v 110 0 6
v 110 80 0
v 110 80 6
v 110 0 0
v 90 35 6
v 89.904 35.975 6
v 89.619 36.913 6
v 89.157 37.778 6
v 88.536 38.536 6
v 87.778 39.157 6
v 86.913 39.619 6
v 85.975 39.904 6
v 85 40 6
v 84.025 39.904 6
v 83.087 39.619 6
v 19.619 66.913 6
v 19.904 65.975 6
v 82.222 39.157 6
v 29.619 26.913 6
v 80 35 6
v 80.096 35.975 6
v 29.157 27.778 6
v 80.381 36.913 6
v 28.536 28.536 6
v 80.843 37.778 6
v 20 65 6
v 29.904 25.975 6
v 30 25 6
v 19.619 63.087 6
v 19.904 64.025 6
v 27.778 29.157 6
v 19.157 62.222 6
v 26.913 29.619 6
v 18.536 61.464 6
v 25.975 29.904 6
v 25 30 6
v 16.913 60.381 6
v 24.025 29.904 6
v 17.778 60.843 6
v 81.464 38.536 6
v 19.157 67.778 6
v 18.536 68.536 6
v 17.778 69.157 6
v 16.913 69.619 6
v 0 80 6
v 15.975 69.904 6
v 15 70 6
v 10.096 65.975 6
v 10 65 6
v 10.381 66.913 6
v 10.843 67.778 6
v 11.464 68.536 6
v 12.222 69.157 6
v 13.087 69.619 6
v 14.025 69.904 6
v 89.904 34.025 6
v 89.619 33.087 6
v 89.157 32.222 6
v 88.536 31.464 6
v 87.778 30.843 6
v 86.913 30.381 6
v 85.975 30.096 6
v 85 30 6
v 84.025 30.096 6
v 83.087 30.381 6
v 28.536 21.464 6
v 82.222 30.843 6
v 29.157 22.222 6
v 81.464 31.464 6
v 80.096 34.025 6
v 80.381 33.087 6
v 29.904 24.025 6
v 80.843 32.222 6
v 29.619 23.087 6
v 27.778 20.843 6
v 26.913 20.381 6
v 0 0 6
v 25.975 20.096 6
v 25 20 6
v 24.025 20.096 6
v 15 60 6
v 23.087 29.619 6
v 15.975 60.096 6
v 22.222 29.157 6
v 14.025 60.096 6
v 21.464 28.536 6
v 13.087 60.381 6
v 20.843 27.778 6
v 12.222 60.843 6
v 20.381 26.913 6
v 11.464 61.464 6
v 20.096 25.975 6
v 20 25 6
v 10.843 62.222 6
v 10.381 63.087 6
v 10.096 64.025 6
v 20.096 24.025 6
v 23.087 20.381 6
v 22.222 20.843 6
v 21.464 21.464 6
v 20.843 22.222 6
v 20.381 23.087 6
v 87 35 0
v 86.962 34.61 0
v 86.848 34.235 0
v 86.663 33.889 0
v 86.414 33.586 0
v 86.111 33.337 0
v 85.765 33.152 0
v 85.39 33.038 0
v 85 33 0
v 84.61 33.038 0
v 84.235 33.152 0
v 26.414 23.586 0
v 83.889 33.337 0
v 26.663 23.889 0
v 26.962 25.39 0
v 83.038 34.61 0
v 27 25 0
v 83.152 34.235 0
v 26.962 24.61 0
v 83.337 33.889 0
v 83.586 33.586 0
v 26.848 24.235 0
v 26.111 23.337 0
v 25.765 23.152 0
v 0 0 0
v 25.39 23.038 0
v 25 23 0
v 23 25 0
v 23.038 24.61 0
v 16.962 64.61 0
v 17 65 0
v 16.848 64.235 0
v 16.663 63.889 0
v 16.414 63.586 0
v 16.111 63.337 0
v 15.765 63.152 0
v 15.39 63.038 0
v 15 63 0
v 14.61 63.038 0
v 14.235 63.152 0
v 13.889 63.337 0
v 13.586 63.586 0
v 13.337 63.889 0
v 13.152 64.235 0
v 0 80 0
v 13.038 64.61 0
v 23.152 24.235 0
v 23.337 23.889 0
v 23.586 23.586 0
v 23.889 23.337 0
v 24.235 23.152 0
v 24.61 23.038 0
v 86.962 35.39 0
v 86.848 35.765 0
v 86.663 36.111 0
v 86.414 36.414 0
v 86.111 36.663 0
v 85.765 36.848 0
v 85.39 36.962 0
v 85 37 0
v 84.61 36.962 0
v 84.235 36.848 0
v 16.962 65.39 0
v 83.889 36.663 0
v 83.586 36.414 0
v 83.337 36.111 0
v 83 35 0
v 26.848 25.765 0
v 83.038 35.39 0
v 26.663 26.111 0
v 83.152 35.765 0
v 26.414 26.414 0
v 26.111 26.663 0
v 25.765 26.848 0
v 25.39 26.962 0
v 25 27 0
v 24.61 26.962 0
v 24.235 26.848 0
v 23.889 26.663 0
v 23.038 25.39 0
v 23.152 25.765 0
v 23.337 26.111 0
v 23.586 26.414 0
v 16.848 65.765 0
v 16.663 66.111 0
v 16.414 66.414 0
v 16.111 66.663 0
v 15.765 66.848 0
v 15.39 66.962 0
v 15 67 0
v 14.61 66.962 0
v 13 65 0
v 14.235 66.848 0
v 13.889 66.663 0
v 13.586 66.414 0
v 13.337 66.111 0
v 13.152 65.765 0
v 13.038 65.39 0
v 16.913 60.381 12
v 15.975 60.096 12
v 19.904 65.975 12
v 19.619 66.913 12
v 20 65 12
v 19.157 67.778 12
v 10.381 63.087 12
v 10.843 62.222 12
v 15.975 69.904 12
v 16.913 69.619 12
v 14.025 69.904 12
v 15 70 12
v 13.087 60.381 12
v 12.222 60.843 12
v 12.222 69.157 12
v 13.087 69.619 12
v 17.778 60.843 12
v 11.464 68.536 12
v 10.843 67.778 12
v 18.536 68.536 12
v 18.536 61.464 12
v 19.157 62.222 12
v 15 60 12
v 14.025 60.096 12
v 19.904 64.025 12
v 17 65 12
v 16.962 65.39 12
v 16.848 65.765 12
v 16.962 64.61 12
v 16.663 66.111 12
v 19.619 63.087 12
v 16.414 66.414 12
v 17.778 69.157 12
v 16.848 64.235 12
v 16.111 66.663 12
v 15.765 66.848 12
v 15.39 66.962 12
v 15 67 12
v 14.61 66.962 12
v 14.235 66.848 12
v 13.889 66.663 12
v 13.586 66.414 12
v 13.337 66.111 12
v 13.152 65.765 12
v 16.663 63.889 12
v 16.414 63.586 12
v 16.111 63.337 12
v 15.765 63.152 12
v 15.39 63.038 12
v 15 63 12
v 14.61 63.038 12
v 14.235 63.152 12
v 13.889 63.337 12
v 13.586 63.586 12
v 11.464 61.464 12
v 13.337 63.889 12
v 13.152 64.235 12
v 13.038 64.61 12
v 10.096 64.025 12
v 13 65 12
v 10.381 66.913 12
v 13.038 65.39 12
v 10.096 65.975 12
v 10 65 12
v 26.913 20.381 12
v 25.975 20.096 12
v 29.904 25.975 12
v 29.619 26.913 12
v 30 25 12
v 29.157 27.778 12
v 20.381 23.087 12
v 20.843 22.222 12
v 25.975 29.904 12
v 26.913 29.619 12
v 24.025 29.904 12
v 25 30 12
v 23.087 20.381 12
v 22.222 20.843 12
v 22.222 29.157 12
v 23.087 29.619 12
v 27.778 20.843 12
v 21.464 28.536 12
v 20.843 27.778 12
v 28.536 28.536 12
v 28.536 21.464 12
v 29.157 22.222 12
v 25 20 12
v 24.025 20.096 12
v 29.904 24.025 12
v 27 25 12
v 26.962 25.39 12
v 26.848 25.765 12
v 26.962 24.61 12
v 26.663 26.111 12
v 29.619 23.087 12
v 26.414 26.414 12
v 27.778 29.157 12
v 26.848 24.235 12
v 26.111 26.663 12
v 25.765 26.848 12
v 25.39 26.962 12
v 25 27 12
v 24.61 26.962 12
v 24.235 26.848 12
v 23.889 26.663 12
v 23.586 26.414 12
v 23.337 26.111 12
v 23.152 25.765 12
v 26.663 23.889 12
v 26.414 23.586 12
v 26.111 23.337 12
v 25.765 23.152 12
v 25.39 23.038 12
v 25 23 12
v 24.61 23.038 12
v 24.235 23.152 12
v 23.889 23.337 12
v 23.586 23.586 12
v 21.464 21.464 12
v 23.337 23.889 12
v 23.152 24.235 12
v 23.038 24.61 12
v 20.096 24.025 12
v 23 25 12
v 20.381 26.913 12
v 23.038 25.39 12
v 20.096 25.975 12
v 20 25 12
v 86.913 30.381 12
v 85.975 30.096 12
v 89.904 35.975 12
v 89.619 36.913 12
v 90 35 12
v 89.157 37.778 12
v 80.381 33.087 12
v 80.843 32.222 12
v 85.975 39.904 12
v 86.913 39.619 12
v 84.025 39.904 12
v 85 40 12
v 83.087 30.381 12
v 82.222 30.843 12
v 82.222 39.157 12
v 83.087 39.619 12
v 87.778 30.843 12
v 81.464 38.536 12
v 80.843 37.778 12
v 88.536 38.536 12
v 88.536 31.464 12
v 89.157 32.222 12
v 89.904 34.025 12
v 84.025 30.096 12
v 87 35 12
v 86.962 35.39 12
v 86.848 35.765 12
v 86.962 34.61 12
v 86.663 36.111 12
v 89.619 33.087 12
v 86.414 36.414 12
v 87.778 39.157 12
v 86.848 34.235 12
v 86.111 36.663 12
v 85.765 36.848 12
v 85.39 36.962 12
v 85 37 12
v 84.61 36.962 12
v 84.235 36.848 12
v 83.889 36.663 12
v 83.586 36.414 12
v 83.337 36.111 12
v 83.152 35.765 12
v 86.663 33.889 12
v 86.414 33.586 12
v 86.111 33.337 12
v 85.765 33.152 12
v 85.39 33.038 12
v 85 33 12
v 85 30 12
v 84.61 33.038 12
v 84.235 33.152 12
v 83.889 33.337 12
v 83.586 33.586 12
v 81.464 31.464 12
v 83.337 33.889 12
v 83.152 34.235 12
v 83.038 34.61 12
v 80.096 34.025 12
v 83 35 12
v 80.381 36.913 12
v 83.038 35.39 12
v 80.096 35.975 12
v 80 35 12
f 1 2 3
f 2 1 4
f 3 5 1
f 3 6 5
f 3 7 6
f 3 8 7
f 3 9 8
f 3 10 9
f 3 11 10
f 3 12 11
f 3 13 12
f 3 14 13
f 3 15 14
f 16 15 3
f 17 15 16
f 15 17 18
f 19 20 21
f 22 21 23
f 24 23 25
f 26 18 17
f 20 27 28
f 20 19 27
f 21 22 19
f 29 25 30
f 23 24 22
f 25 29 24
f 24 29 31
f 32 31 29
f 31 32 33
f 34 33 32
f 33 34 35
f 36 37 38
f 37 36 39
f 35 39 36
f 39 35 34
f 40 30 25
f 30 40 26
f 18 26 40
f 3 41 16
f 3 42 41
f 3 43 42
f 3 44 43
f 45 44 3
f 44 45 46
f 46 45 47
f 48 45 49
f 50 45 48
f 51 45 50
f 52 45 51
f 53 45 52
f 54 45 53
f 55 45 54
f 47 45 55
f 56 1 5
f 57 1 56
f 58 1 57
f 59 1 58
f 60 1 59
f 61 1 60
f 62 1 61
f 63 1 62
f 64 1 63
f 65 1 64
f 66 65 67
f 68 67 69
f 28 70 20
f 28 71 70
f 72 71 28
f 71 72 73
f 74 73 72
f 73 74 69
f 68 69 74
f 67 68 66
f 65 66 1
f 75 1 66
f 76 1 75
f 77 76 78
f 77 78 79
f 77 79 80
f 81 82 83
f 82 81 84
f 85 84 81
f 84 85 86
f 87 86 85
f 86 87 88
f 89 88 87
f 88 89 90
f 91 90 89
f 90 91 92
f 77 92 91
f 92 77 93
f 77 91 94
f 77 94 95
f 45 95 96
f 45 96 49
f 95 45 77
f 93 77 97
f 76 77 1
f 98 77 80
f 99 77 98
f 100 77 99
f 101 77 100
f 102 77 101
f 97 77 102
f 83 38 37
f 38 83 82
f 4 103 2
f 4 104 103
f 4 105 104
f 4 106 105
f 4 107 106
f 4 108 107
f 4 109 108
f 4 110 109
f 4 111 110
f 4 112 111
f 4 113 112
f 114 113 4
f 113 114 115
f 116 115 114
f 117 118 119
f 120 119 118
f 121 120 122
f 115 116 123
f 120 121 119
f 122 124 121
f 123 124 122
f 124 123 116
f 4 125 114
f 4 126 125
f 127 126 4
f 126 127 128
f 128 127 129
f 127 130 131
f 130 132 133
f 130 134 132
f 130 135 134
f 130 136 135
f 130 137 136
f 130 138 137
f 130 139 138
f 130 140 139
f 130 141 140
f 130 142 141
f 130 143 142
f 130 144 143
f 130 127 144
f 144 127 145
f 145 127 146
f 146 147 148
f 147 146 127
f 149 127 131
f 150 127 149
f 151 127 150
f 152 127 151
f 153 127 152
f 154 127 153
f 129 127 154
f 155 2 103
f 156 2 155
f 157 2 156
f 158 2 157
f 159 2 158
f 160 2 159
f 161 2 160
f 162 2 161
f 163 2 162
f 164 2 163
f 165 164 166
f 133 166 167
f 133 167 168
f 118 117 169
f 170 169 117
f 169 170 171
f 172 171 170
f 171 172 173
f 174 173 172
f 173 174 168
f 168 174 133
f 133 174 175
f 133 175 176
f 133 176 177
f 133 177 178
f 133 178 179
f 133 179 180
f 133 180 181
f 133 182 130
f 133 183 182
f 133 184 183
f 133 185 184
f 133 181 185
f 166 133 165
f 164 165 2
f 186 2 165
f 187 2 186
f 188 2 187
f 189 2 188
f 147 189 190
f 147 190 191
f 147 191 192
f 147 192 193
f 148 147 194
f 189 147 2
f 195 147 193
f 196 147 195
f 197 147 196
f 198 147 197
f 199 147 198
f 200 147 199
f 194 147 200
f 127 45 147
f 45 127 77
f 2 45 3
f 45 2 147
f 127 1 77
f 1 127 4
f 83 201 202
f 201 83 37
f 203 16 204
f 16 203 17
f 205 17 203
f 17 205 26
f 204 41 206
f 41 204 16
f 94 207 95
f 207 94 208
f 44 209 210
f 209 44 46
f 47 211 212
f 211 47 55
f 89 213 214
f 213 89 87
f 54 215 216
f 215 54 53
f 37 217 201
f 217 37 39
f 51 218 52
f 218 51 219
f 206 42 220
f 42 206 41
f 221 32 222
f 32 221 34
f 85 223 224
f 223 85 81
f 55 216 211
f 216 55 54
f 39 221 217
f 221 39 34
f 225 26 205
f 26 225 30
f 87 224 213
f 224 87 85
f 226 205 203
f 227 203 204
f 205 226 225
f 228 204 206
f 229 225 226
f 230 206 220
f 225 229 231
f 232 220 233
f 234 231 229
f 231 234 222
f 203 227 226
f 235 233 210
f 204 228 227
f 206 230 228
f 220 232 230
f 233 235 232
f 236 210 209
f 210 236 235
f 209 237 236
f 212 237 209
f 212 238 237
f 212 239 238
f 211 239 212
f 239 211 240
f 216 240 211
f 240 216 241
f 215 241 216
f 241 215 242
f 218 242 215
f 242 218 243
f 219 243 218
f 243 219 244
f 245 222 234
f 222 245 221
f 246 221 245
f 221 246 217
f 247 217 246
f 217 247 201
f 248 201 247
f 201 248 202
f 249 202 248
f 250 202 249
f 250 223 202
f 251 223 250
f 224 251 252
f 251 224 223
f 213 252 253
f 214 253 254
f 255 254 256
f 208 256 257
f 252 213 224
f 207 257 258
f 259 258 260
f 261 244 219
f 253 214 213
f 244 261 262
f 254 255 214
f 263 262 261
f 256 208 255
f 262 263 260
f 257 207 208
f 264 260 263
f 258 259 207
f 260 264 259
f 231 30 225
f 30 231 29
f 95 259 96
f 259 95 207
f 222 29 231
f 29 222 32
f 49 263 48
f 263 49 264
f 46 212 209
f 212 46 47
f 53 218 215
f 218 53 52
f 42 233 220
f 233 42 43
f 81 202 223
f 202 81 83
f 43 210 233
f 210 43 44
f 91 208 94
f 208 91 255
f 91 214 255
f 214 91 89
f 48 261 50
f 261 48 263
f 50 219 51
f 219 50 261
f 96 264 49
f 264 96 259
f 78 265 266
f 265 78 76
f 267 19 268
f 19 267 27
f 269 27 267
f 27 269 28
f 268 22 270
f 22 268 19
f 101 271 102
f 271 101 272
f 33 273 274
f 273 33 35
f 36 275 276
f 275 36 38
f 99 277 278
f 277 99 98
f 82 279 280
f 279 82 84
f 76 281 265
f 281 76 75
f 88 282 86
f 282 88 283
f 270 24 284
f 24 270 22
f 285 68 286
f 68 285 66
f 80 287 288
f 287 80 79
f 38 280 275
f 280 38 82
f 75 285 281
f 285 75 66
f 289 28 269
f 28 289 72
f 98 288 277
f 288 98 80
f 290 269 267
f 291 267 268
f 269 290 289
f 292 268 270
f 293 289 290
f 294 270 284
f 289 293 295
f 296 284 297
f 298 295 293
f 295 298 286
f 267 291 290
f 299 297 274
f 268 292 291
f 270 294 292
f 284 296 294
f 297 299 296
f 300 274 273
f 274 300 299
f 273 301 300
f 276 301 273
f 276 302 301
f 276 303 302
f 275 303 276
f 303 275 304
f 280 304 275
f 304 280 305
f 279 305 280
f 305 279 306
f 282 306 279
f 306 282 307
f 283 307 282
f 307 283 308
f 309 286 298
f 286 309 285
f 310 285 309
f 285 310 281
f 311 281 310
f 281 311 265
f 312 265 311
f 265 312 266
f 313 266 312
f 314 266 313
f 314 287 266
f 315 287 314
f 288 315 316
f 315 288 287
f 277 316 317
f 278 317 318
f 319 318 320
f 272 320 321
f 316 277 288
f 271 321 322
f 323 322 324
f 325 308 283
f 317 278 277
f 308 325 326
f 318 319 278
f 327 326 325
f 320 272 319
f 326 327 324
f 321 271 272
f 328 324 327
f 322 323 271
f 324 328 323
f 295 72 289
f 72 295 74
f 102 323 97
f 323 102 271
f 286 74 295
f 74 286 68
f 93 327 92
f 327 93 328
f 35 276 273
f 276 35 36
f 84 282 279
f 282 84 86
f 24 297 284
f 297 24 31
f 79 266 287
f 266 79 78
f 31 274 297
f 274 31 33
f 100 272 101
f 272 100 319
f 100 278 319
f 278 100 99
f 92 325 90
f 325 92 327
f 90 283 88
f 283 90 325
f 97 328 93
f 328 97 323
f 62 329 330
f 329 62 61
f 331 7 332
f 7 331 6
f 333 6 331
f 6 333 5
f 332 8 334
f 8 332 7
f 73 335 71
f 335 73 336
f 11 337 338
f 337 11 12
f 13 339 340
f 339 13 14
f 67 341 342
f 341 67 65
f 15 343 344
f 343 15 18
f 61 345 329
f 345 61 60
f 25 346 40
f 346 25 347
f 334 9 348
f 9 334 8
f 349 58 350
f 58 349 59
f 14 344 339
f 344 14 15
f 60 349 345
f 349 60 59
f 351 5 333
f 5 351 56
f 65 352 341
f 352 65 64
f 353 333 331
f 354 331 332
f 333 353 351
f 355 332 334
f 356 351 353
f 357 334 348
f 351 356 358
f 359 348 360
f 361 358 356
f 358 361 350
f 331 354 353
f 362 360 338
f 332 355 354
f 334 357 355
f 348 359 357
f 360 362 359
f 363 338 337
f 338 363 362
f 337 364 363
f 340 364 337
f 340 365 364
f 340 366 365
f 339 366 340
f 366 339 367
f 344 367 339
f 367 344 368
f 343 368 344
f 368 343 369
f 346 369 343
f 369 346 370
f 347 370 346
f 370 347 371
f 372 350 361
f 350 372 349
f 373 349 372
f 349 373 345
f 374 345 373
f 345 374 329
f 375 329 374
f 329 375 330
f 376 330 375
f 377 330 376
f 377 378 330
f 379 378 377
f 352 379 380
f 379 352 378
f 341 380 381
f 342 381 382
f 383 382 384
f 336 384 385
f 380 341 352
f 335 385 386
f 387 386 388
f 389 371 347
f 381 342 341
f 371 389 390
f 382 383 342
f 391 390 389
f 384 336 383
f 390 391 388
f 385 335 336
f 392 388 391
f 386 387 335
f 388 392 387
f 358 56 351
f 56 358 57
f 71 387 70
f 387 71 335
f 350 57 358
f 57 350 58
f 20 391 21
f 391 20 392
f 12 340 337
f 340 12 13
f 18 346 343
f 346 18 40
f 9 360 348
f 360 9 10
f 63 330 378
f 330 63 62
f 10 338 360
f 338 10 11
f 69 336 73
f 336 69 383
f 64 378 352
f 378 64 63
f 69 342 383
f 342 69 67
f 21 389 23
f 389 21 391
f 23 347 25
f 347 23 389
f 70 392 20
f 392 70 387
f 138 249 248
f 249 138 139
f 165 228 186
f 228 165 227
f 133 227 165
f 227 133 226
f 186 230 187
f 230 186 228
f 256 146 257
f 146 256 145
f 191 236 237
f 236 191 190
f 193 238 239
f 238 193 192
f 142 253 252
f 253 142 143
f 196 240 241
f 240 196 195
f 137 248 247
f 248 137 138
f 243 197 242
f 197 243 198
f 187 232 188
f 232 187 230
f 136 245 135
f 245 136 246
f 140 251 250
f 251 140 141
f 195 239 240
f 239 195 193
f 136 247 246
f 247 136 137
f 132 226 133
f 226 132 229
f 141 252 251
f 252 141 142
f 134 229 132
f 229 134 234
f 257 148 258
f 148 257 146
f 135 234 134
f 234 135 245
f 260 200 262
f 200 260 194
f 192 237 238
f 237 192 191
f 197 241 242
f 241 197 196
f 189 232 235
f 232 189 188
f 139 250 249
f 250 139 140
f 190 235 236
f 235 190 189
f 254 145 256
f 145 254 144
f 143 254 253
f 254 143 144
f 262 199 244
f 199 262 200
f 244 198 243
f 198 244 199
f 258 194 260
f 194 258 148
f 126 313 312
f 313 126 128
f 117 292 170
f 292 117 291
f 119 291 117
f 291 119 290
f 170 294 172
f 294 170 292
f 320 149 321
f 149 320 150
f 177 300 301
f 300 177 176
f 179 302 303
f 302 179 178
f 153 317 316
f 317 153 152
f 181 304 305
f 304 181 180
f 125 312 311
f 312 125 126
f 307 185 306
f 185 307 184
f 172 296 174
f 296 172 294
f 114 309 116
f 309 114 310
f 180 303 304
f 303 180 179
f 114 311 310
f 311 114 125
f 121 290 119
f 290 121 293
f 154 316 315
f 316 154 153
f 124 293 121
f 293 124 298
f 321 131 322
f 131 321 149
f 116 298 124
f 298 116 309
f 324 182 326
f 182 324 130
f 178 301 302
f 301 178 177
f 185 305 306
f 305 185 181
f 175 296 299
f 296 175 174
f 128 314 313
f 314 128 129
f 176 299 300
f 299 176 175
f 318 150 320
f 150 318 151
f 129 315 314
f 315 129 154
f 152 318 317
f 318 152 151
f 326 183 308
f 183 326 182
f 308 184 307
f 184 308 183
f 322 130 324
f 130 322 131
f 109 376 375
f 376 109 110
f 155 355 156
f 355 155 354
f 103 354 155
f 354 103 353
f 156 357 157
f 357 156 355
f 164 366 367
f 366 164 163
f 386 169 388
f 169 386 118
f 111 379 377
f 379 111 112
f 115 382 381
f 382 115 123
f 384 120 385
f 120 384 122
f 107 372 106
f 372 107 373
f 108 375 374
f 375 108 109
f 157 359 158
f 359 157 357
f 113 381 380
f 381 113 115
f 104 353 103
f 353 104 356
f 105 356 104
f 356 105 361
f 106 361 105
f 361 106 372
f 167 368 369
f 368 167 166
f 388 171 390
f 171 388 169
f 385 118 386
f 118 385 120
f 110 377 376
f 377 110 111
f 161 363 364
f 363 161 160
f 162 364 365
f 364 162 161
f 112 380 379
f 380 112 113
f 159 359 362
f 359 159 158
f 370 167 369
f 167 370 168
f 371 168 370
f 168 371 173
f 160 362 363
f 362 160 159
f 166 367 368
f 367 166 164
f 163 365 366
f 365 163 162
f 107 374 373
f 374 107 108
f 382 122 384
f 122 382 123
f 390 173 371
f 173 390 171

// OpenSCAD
$fn = 32;

// ----------------------------------------------------------------------
// Boss field: plate with bosses at given coordinates
// ----------------------------------------------------------------------

// --- parameters (mm) ---
plate_l = 110;            // plate length, X
plate_w = 80;             // plate width, Y
plate_t = 6;              // plate thickness, Z
boss_d = 10;              // boss diameter
boss_h = 6;               // boss height above the plate
bore_d = 4;               // boss bore

total_h = plate_t + boss_h;  // overall height

difference() {
  union() {
    cube([plate_l, plate_w, plate_t]);
    translate([15, 65, plate_t]) cylinder(h = boss_h, d = boss_d);
    translate([25, 25, plate_t]) cylinder(h = boss_h, d = boss_d);
    translate([85, 35, plate_t]) cylinder(h = boss_h, d = boss_d);
  }
  translate([15, 65, -1]) cylinder(h = total_h + 2, d = bore_d);
  translate([25, 25, -1]) cylinder(h = total_h + 2, d = bore_d);
  translate([85, 35, -1]) cylinder(h = total_h + 2, d = bore_d);
}
